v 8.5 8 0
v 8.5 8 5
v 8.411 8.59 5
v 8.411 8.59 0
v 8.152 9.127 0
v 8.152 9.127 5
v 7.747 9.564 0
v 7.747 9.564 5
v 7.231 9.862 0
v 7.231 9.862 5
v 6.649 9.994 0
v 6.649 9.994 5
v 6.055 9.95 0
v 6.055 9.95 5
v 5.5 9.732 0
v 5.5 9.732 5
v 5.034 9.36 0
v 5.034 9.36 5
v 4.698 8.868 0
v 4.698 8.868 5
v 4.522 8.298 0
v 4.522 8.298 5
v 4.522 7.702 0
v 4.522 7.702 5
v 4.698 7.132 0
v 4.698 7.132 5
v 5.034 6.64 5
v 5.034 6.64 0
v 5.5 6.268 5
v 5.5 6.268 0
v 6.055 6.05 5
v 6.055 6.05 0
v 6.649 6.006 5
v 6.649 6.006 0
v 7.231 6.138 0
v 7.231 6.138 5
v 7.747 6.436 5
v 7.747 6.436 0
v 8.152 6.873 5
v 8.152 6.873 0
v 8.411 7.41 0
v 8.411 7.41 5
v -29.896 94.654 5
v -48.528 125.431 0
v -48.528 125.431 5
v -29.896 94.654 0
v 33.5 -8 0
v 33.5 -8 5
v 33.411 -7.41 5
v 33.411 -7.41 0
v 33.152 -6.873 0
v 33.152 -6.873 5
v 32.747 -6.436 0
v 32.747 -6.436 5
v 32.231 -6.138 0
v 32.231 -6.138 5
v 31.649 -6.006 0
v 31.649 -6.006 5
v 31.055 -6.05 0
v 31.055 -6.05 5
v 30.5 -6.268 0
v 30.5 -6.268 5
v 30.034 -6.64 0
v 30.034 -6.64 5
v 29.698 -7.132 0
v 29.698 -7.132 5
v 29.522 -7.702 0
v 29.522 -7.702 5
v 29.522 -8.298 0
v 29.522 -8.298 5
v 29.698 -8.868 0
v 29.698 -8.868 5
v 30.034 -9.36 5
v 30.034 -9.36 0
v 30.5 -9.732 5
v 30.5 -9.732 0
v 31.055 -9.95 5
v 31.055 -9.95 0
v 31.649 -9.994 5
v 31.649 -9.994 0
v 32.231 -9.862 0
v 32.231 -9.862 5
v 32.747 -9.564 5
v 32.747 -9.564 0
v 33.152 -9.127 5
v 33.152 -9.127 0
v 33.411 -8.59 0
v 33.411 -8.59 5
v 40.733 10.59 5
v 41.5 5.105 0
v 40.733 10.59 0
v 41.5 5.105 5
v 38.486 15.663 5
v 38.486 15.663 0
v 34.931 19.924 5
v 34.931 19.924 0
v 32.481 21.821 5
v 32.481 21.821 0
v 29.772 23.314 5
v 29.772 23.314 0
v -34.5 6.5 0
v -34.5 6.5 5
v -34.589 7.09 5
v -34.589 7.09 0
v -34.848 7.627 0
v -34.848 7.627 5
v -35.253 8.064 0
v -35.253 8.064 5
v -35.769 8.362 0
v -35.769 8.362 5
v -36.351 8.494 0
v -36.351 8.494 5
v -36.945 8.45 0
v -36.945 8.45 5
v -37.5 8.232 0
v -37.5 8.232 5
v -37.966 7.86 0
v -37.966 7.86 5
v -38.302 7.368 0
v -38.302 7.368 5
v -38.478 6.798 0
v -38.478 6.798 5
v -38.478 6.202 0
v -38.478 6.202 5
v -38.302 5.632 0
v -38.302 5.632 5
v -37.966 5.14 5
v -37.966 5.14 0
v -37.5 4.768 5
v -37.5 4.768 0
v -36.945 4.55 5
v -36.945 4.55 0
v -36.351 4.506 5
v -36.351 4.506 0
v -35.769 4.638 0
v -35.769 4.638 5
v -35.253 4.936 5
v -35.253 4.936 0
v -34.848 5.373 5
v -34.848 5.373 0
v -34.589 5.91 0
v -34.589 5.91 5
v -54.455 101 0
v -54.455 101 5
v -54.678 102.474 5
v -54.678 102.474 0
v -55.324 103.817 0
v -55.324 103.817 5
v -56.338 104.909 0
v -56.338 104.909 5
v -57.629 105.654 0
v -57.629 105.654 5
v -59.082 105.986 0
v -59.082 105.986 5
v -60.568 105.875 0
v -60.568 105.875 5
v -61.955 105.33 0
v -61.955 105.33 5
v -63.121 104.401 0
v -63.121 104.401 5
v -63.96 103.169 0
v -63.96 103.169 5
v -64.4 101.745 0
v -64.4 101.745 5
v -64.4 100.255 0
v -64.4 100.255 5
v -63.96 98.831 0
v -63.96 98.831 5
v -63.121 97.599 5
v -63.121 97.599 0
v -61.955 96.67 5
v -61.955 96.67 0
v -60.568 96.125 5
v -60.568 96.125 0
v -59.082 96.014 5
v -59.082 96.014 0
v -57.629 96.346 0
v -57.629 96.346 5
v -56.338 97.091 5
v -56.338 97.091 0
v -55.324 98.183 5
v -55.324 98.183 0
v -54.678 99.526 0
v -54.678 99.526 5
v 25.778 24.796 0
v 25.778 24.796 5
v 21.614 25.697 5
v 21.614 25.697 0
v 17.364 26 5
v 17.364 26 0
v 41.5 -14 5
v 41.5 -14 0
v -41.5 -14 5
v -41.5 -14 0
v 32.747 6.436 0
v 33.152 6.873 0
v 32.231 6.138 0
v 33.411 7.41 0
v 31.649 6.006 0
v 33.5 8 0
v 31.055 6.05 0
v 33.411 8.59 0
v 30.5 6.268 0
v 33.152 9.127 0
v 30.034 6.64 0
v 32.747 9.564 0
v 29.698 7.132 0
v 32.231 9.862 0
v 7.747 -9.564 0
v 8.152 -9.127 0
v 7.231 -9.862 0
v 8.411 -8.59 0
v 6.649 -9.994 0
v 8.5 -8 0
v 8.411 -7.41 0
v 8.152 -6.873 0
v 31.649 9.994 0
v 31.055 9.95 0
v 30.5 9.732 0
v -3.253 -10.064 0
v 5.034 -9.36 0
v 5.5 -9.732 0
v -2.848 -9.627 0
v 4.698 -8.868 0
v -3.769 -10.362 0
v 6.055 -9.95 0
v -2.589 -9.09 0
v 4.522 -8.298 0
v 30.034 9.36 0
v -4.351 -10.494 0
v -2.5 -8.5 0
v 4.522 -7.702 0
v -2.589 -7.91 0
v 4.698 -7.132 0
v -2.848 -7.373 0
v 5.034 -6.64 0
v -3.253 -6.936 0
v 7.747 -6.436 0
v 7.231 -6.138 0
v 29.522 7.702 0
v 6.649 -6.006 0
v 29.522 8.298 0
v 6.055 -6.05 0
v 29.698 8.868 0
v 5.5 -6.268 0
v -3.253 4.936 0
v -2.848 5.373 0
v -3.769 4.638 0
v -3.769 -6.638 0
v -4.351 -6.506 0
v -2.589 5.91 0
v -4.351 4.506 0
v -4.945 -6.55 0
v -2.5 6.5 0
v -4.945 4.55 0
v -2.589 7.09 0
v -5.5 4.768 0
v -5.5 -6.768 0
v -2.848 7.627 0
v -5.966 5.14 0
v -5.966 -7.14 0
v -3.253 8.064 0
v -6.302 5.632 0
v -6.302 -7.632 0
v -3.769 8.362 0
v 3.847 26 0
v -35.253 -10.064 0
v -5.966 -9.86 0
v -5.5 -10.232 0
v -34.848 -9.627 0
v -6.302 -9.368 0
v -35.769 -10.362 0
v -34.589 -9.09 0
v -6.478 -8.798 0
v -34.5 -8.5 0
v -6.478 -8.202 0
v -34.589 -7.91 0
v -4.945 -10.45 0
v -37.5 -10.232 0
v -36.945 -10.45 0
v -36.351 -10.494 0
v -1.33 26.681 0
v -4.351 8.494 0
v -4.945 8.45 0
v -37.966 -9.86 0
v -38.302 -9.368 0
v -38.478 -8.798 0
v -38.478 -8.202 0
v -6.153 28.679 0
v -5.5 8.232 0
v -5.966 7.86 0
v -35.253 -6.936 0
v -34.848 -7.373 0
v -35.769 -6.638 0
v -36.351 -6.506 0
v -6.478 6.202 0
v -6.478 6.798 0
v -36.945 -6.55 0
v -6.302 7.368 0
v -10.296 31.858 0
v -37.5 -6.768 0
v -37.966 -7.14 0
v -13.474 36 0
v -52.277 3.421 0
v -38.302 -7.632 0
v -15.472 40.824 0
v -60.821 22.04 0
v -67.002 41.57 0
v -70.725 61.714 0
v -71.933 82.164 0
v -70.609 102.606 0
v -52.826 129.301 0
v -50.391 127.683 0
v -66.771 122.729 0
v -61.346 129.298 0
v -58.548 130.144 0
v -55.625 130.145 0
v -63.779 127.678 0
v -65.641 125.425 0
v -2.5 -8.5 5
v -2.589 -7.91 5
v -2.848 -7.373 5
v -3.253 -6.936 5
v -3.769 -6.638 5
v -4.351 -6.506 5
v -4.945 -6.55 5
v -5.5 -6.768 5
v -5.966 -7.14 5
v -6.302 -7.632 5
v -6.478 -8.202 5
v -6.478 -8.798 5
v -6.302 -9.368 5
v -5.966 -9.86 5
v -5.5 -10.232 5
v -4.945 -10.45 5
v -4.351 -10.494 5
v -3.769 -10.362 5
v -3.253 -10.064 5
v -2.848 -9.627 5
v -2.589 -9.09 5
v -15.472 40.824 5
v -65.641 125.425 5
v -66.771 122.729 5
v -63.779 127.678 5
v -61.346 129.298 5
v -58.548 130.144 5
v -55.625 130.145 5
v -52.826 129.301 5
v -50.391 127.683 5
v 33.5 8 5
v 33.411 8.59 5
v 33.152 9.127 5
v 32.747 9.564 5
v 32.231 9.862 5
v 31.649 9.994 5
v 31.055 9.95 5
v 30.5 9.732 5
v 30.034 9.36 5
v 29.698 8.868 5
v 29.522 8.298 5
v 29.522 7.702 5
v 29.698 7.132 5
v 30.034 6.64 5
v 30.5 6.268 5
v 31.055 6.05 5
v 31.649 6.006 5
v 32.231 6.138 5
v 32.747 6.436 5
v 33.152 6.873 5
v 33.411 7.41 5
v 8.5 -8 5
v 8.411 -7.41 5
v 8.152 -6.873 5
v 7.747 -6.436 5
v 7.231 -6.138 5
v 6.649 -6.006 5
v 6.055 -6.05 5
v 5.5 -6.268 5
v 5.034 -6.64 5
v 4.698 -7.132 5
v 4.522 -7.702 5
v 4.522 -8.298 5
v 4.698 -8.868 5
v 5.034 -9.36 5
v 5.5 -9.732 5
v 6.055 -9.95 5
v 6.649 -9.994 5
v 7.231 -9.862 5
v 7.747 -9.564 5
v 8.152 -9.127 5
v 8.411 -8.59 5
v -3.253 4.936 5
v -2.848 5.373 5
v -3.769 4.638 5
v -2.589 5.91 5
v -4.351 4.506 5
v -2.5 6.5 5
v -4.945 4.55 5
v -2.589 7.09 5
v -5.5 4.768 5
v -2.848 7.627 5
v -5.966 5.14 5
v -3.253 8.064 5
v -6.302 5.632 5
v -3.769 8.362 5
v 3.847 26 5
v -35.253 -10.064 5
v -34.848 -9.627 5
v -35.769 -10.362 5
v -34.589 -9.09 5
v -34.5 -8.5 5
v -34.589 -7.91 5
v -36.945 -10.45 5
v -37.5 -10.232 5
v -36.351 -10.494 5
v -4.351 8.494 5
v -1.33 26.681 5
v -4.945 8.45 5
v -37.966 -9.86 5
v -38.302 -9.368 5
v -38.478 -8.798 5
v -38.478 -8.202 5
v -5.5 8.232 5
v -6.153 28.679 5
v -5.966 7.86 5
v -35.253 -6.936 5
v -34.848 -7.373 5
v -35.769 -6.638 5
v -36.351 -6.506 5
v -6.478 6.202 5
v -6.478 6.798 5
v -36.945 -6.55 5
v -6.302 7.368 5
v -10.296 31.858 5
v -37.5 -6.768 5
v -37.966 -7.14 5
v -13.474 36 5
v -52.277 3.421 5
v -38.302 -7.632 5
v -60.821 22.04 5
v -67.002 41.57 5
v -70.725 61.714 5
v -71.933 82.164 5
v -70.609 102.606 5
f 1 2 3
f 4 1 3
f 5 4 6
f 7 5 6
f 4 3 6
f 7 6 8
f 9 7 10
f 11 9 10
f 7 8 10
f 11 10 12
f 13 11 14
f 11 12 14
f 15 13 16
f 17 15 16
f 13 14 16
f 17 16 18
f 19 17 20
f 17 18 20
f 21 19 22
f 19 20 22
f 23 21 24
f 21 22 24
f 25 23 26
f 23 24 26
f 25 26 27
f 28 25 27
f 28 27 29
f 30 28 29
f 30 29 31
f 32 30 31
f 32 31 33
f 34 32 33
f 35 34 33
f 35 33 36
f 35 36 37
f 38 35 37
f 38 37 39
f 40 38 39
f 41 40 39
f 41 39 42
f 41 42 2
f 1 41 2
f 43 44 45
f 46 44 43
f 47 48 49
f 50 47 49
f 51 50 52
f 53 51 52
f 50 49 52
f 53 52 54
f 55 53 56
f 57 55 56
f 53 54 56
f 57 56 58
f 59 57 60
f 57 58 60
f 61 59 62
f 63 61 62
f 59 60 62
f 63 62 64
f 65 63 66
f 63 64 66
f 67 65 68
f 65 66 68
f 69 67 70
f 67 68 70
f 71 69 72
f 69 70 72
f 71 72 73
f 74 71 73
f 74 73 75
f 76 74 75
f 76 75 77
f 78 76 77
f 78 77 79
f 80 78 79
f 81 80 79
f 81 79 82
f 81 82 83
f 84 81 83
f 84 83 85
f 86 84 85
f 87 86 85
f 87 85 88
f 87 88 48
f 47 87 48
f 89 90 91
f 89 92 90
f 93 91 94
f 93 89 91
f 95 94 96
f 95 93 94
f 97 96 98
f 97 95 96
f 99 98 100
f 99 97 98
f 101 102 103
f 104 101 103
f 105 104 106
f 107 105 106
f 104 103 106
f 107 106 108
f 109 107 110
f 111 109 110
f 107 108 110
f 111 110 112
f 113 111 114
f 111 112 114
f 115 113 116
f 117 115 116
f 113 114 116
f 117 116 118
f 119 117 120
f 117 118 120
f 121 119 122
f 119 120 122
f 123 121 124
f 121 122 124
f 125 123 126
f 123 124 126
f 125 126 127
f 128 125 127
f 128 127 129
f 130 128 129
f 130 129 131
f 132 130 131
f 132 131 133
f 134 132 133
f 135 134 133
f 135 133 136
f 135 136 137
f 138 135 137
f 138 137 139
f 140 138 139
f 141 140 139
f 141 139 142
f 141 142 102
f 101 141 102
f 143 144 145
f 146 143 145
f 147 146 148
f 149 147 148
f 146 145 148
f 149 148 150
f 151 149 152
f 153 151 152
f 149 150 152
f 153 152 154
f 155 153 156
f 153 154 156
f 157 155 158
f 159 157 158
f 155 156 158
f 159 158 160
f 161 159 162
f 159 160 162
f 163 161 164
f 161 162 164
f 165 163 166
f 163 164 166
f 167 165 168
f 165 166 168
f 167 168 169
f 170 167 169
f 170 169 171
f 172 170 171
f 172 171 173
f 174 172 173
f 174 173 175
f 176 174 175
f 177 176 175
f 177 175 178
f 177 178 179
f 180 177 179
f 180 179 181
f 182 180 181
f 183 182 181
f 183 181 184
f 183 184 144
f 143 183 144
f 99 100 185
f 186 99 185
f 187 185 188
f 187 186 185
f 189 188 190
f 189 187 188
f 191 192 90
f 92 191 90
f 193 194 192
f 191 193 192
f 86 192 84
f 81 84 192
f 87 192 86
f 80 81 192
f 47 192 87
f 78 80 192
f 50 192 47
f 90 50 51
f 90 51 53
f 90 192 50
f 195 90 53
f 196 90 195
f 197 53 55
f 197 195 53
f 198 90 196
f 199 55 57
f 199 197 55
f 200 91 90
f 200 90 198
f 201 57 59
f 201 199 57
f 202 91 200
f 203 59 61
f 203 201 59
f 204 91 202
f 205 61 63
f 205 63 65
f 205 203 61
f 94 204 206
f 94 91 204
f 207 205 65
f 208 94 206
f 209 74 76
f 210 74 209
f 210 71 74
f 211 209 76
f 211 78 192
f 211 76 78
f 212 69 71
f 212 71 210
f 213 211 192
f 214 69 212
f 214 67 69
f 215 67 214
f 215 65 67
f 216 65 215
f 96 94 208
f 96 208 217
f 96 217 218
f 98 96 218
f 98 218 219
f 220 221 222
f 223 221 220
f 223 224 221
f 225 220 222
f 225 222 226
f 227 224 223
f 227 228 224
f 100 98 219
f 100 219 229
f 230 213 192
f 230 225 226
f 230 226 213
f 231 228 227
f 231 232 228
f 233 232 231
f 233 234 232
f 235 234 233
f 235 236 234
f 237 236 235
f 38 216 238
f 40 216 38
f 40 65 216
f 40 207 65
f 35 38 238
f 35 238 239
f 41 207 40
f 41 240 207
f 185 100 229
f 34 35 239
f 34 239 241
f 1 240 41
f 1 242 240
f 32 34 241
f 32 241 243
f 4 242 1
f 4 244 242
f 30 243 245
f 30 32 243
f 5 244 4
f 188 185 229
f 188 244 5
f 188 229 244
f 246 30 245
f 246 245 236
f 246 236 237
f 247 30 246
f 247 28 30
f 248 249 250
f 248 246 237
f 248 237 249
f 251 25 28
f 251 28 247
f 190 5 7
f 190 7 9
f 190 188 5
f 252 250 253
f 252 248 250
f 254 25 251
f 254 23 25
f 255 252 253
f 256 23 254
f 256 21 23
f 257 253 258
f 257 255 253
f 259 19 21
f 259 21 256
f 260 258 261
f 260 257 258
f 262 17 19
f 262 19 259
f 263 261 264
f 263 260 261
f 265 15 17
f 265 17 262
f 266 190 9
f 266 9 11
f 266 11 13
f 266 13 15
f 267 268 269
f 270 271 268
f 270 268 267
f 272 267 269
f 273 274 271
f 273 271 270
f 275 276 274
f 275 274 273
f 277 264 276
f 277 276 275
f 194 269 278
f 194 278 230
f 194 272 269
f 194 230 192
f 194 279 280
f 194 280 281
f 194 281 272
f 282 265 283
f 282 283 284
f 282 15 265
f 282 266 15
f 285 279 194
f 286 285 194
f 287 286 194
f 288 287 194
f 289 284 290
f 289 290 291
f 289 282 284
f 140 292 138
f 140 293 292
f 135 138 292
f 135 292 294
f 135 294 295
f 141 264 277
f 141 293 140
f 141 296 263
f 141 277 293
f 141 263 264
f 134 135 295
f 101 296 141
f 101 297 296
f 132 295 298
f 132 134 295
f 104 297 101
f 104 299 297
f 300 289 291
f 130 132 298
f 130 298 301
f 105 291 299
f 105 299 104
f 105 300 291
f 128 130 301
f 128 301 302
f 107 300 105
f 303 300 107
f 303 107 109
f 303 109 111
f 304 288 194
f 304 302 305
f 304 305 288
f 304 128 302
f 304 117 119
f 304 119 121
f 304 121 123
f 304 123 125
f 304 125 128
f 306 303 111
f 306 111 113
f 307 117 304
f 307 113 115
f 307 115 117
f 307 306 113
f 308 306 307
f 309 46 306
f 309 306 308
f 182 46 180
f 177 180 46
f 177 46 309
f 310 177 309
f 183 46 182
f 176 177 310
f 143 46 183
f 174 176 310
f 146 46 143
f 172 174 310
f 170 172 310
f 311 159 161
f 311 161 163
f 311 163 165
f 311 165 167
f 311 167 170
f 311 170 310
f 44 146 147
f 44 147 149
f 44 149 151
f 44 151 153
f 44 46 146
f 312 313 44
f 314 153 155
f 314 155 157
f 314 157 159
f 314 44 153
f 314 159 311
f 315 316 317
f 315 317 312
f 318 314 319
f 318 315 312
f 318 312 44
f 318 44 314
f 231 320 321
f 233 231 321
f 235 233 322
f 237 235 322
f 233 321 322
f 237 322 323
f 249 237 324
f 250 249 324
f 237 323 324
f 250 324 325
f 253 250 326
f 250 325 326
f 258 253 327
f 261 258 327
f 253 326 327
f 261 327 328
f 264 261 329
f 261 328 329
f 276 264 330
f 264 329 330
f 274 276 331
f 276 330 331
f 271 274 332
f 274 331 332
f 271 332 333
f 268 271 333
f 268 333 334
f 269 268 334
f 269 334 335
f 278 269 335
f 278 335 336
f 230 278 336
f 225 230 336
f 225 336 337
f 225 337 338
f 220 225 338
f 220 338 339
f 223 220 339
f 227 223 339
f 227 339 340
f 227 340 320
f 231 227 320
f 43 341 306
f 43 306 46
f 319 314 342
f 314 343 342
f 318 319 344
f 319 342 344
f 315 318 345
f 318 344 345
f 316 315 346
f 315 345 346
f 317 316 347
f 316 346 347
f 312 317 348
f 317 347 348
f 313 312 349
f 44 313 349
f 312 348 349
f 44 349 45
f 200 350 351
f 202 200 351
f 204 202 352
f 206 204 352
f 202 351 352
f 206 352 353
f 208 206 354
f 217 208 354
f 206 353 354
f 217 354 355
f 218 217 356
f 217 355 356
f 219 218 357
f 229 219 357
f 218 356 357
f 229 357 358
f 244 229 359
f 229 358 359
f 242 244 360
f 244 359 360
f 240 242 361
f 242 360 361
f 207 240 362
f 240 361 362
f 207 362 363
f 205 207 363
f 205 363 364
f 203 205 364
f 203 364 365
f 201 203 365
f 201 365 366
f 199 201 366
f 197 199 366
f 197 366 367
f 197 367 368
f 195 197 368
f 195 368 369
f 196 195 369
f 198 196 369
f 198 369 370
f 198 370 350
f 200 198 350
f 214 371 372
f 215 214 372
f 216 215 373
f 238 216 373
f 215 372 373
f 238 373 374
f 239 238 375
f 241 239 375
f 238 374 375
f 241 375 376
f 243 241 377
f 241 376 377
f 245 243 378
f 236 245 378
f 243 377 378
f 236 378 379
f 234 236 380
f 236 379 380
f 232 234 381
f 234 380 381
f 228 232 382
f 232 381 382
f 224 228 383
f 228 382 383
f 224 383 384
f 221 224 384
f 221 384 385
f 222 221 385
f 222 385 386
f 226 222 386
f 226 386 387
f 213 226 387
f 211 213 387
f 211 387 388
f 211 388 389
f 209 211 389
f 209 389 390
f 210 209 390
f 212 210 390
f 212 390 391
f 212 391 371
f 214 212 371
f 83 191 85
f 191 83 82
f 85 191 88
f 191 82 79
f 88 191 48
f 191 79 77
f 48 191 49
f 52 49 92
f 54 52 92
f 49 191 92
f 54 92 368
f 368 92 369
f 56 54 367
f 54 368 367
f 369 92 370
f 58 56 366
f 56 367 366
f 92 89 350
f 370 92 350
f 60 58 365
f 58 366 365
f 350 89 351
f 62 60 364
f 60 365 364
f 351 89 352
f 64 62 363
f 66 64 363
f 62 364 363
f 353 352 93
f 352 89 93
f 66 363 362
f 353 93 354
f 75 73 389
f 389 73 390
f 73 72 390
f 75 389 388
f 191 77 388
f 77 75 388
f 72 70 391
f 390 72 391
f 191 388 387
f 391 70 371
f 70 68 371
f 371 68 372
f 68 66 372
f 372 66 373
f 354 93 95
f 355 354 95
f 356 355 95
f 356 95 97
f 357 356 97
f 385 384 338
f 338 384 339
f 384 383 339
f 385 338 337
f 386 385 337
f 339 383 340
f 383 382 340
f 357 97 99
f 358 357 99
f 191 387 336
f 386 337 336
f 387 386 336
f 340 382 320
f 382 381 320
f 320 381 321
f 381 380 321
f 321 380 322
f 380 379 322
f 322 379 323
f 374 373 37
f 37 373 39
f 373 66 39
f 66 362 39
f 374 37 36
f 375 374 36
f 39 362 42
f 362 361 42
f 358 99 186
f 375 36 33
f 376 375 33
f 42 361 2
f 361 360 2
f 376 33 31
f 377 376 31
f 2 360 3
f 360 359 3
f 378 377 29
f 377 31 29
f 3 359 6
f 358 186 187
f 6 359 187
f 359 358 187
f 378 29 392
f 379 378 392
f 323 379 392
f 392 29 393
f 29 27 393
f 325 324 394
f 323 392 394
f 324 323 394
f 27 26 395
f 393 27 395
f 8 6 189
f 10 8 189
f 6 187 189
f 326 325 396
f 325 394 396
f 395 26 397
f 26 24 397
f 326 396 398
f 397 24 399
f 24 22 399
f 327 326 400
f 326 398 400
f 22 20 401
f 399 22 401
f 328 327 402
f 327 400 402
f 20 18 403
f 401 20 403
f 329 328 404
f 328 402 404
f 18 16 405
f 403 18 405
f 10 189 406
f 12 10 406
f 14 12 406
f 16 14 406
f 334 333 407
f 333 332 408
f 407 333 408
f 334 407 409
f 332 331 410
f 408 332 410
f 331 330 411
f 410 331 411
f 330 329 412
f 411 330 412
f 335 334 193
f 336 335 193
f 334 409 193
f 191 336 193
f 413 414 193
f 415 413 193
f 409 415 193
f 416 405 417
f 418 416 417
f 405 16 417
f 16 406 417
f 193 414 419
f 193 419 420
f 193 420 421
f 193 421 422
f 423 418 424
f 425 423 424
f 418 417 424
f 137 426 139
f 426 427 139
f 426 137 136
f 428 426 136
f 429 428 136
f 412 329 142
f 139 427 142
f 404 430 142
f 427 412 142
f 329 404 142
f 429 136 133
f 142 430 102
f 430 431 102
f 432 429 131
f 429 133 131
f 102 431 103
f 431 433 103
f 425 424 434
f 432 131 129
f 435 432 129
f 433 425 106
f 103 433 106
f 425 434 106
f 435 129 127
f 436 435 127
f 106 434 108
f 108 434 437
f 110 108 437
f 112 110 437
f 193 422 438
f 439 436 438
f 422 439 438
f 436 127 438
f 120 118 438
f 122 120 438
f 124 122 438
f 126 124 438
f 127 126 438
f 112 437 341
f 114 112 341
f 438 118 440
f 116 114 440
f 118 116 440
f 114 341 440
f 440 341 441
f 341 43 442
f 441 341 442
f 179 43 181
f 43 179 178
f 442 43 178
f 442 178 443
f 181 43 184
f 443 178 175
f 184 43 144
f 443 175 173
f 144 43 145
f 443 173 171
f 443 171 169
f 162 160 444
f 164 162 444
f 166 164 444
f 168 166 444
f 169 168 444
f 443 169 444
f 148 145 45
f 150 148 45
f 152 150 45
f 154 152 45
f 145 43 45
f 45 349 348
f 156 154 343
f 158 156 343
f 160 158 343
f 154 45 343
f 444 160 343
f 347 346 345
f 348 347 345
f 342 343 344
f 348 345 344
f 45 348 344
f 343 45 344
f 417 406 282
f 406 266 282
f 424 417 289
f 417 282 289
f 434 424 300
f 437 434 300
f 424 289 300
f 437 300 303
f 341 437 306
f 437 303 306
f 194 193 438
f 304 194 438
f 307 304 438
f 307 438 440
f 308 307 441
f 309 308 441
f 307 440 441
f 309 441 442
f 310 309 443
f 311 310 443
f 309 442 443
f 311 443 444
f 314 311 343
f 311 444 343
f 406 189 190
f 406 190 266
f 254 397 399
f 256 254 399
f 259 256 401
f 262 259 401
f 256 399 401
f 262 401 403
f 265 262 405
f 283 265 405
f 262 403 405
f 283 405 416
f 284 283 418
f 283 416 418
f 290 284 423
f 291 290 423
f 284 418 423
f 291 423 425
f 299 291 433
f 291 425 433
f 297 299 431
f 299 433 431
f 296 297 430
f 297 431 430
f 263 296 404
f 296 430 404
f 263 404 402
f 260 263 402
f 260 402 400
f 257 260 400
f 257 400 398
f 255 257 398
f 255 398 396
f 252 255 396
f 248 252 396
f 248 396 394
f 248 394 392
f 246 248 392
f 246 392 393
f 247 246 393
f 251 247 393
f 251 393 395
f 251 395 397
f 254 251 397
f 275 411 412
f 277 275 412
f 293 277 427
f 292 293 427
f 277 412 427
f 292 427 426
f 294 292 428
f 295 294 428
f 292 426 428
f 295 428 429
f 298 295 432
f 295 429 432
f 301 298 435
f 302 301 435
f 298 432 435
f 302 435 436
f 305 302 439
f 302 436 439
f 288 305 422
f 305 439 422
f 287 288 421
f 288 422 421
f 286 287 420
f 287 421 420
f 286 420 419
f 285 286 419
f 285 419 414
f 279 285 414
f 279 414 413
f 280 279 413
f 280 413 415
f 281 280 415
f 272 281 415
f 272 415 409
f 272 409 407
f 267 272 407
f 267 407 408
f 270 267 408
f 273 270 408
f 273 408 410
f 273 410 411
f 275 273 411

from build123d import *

# Parameters (mm, degrees)
SKETCH_1_W          = 83
SKETCH_1_H          = 28
EXTRUDE_1_DEPTH     = 5
SKETCH_2_R          = 2
CUT_EXTRUDE_1_DEPTH = 45.082309377
EXTRUDE_2_DEPTH     = 5
CUT_EXTRUDE_3_DEPTH = 156.991954214
FILLET_4_R          = 30
FILLET_5_R          = 20
SKETCH_6_R          = 2
CUT_EXTRUDE_4_DEPTH = 156.991954214
EXTRUDE_3_DEPTH     = 5
FILLET_7_R          = 10
SKETCH_8_R          = 5
CUT_EXTRUDE_5_DEPTH = 149.879193137
FILLET_8_R          = 20


with BuildPart() as part:
    # 草图1 → 凸台-拉伸1 (new body)
    with BuildSketch(Plane.XY):
        Rectangle(SKETCH_1_W, SKETCH_1_H)
    extrude(amount=EXTRUDE_1_DEPTH)

    # 草图2 → 切除-拉伸1 (cut, through all)
    with BuildSketch(Plane.XY.offset(5)):
        with Locations((6.5, 8)):
            Circle(SKETCH_2_R)
        with Locations((31.5, 8)):
            Circle(SKETCH_2_R)
        with Locations((31.5, -8)):
            Circle(SKETCH_2_R)
        with Locations((6.5, -8)):
            Circle(SKETCH_2_R)
    extrude(amount=-CUT_EXTRUDE_1_DEPTH, mode=Mode.SUBTRACT)

    # 草图3 → 凸台-拉伸2 (add)
    with BuildSketch(Plane(origin=(0, 0, 0), x_dir=(-1, 0, 0), z_dir=(0, 0, -1))):
        Polygon((41.5, 14), (59.770308511, 144), (29.5, 94), (-41.5, 14), align=None)
    extrude(amount=-EXTRUDE_2_DEPTH)

    # 草图5 → 切除-拉伸3 (cut, through all)
    with BuildSketch(Plane.XY.offset(5)):
        Polygon((36.5, 26), (-11.5, 26), (-35.602469952, 115.951642448), align=None)
    extrude(amount=-CUT_EXTRUDE_3_DEPTH, mode=Mode.SUBTRACT)

    # 圆角4
    fillet_4_edges = [part.edges().sort_by_distance(p)[0] for p in [
        (30.85, 26, 2.5),
    ]]
    fillet(fillet_4_edges, radius=FILLET_4_R)

    # 圆角5
    fillet_5_edges = [part.edges().sort_by_distance(p)[0] for p in [
        (-11.5, 26, 2.5),
    ]]
    fillet(fillet_5_edges, radius=FILLET_5_R)

    # 草图6 → 切除-拉伸4 (cut, through all)
    with BuildSketch(Plane.XY.offset(5)):
        with Locations((-36.5, -8.5)):
            Circle(SKETCH_6_R)
        with Locations((-4.5, -8.5)):
            Circle(SKETCH_6_R)
        with Locations((-4.5, 6.5)):
            Circle(SKETCH_6_R)
        with Locations((-36.5, 6.5)):
            Circle(SKETCH_6_R)
    extrude(amount=-CUT_EXTRUDE_4_DEPTH, mode=Mode.SUBTRACT)

    # 草图7 → 凸台-拉伸3 (add)
    with BuildSketch(Plane.XY.offset(5)):
        with BuildLine():
            Line((-41.5, 14), (-41.5, -14))
            ThreePointArc((-41.5, -14), (-70.837432371, 62.663912318), (-59.770308511, 144))
            Line((-59.770308511, 144), (-41.5, 14))
        make_face()
    extrude(amount=-EXTRUDE_3_DEPTH)

    # 圆角7
    fillet_7_edges = [part.edges().sort_by_distance(p)[0] for p in [
        (-59.770308511, 144, 2.5),
    ]]
    fillet(fillet_7_edges, radius=FILLET_7_R)

    # 草图8 → 切除-拉伸5 (cut, through all)
    with BuildSketch(Plane.XY.offset(5)):
        with Locations((-59.455425686, 101)):
            Circle(SKETCH_8_R)
    extrude(amount=-CUT_EXTRUDE_5_DEPTH, mode=Mode.SUBTRACT)

    # 圆角8
    fillet_8_edges = [part.edges().sort_by_distance(p)[0] for p in [
        (41.5, 14, 2.5),
    ]]
    fillet(fillet_8_edges, radius=FILLET_8_R)


solid = part.part
